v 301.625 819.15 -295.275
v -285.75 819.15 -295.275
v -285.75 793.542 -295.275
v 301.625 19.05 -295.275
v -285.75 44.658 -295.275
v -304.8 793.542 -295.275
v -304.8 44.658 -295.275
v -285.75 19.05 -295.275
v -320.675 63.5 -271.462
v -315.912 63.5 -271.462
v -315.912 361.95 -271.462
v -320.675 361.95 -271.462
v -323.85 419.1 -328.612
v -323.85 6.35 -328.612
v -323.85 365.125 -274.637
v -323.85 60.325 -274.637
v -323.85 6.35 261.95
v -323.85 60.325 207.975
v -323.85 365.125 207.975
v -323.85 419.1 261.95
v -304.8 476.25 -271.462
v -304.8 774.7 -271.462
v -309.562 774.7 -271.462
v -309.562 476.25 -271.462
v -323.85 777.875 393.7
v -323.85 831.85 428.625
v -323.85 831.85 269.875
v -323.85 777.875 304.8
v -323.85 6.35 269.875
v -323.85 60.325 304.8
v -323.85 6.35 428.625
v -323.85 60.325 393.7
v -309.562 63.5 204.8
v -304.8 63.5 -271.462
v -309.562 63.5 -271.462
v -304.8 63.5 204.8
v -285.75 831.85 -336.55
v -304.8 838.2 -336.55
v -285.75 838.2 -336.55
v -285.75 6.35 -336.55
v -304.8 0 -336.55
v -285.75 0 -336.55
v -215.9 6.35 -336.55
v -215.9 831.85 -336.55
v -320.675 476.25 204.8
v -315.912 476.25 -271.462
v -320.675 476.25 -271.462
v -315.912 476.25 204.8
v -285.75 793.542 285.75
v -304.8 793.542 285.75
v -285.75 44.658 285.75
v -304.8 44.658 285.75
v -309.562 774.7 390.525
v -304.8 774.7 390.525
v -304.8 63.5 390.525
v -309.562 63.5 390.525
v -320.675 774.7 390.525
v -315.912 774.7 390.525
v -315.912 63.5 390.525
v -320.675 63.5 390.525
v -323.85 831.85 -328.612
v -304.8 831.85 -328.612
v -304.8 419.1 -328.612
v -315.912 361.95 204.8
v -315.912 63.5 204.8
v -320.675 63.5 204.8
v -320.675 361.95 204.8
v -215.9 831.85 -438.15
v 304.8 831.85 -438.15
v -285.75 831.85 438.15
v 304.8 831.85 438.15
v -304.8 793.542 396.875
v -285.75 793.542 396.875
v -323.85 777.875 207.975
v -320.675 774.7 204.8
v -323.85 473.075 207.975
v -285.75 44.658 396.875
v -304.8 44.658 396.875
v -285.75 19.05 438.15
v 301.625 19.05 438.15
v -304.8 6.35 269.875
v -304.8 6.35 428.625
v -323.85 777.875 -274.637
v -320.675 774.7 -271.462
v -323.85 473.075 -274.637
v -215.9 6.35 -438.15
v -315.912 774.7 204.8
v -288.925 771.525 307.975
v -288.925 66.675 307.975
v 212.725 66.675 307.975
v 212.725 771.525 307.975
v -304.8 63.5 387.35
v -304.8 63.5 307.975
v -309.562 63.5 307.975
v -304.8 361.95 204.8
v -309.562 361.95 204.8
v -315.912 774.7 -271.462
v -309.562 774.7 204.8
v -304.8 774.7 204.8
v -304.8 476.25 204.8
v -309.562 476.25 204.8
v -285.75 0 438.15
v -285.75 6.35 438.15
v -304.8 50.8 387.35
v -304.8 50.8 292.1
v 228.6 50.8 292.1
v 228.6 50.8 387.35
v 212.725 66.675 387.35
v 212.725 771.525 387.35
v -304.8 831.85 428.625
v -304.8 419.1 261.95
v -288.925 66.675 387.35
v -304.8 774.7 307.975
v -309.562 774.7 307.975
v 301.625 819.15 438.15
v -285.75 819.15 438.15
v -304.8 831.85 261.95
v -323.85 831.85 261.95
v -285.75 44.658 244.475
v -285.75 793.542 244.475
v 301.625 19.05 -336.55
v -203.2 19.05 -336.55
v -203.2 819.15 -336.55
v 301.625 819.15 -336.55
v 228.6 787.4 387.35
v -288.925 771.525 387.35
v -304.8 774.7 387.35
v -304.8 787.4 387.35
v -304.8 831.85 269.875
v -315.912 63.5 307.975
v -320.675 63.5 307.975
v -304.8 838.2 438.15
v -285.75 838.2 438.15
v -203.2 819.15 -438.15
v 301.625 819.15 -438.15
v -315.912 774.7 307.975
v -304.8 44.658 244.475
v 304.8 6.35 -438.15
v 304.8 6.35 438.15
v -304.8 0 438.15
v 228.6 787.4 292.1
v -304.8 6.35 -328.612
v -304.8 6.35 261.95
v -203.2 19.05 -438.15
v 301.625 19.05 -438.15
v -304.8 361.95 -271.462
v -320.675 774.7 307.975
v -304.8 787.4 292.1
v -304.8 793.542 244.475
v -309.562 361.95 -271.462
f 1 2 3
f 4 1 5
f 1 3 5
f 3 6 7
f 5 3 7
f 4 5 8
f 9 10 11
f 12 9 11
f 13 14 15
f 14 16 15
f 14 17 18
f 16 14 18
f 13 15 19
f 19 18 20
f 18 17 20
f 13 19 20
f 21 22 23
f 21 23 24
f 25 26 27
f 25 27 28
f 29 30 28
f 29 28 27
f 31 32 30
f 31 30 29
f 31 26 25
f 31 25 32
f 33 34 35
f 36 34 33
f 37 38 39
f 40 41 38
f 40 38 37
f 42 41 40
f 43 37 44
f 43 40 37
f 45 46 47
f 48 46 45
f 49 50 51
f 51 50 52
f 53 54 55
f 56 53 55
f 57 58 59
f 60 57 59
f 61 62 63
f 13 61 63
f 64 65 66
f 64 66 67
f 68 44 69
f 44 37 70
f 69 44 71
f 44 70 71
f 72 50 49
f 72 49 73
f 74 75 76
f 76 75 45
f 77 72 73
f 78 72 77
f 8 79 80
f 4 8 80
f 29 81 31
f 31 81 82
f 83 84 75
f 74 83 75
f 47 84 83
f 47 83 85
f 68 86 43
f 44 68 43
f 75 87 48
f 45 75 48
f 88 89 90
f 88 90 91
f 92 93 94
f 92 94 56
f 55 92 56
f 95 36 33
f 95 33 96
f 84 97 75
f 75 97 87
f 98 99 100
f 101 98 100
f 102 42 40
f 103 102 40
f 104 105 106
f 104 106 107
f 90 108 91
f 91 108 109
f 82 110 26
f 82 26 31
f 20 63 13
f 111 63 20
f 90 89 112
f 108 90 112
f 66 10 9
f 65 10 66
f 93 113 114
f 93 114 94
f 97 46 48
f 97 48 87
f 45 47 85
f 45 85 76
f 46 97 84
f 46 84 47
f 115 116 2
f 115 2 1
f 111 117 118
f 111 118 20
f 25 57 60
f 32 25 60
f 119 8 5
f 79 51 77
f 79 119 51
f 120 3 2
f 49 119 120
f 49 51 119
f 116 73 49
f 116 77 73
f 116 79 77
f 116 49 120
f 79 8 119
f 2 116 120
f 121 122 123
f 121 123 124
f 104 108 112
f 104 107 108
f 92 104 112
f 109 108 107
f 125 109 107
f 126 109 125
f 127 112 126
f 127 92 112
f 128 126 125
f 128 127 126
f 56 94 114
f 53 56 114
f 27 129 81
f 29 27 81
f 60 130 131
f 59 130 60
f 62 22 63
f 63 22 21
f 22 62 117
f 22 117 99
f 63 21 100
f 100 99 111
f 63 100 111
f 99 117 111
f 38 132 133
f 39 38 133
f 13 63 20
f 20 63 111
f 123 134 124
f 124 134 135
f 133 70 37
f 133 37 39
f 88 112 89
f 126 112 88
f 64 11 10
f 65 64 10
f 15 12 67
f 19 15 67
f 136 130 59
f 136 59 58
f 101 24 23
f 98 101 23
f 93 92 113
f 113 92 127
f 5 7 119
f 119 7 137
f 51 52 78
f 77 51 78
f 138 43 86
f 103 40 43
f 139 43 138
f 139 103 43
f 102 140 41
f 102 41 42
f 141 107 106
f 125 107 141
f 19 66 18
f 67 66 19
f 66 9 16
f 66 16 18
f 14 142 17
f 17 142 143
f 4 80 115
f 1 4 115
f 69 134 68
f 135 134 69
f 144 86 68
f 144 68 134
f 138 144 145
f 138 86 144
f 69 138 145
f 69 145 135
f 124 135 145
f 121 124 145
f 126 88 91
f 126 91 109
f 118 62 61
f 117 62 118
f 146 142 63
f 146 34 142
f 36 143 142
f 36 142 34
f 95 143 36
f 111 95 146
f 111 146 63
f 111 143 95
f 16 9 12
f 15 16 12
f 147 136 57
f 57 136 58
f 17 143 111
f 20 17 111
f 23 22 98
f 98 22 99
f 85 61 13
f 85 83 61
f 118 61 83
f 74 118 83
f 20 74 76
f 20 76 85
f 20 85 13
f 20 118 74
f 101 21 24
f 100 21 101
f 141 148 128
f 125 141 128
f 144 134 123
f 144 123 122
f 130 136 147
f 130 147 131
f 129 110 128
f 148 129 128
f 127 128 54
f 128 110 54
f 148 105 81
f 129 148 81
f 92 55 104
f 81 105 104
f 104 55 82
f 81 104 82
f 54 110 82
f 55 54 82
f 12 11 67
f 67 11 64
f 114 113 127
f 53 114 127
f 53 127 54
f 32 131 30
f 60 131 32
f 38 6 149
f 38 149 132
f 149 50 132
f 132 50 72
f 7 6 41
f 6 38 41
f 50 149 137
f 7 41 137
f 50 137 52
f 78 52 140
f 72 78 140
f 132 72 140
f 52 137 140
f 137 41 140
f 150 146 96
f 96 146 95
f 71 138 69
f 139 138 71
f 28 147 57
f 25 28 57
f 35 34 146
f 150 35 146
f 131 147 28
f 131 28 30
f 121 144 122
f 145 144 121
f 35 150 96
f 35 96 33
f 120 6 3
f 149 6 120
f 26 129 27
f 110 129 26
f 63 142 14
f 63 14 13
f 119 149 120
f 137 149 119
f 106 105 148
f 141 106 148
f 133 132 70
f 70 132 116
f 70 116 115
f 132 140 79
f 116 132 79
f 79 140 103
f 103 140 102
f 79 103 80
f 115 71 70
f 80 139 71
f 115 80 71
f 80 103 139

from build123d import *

# Parameters (mm, degrees)
F0_W          = 609.6
F0_H          = 876.3
F1_DEPTH      = 838.2
F2_W          = 88.9
F2_H          = 101.6
F3_DEPTH      = 838.201
F4_W          = 748.8836065574
F4_H          = 692.15
F5_DEPTH      = 19.05
F6_W          = 590.55
F6_H          = 6.35
F7_DEPTH      = 876.301
F8_W          = 587.375
F8_H          = 800.1
F9_DEPTH      = 733.425
F10_W         = 748.8836065574
F10_H         = 41.275
F11_DEPTH     = 19.05
F12_W         = 412.75
F12_H         = 590.5627
F12_W_2       = 298.45
F12_H_2       = 476.2627
F13_DEPTH     = 19.05
F14_W         = 6.35
F14_H         = 298.45
F15_DEPTH     = 476.2627
F16_SIZE      = 3.175
F17_W         = 825.5
F17_H         = 158.75
F17_W_2       = 711.2
F17_H_2       = 82.55
F18_DEPTH     = 19.05
F19_W         = 6.35
F19_H         = 711.2
F20_DEPTH     = 82.55
F21_SIZE      = 3.175
F22_W         = 504.825
F22_H         = 800.1
F23_DEPTH     = 101.6
F24_W         = 736.6
F24_H         = 95.25
F25_DEPTH     = 533.4
F26_T         = 15.875
F26_T3_DEPTH  = 37.249261314
F26_T5_DEPTH  = 37.249261314
F26_T7_DEPTH  = 37.249261314
F26_T9_DEPTH  = 37.249261314
F26_T11_DEPTH = 36.5125
F26_T13_DEPTH = 742.95
F26_T15_DEPTH = 114.3
F26_T17_DEPTH = 127
F26_T19_DEPTH = 768.35
F26_T21_DEPTH = 111.125
F26_T23_DEPTH = 36.5125


# Not quite as in the source:
# - a shell that OpenCascade refuses in one call is made with other operations: the cavity is built on its own and cut out


with BuildPart() as f1:
    # F0 (on Front) → F1 (new body)
    with BuildSketch(Plane.XZ):
        Rectangle(F0_W, F0_H)
    extrude(amount=-F1_DEPTH)

    # F2 (on face) → F3 (cut, through all)
    with BuildSketch(Plane.XZ):
        with Locations((-260.35, -387.35)):
            Rectangle(F2_W, F2_H)
    extrude(amount=-F3_DEPTH, mode=Mode.SUBTRACT)

    # F4 (on face) → F5 (cut)
    with BuildSketch(Plane(origin=(-304.8, 0, 0), x_dir=(0, -1, 0), z_dir=(-1, 0, 0))):
        with Locations((-419.1, 50.8)):
            Rectangle(F4_W, F4_H)
    extrude(amount=-F5_DEPTH, mode=Mode.SUBTRACT)

    # F6 (on face) → F7 (cut, through all)
    with BuildSketch(Plane.XY.offset(438.15)):
        with Locations((9.525, 835.025)):
            Rectangle(F6_W, F6_H)
        with Locations((9.525, 3.175)):
            Rectangle(F6_W, F6_H)
    extrude(amount=-F7_DEPTH, mode=Mode.SUBTRACT)

    # F8 (on face) → F9 (cut, through all)
    with BuildSketch(Plane.XY.offset(438.15)):
        with Locations((7.9375, 419.1)):
            Rectangle(F8_W, F8_H)
    extrude(amount=-F9_DEPTH, mode=Mode.SUBTRACT)

    # F10 (on face) → F11 (join, through all)
    with BuildSketch(Plane(origin=(-304.8, 0, 0), x_dir=(0, -1, 0), z_dir=(-1, 0, 0))):
        with Locations((-419.1, 265.1125)):
            Rectangle(F10_W, F10_H)
    extrude(amount=-F11_DEPTH)

    # F22 (on face) → F23 (cut)
    with BuildSketch(Plane(origin=(0, 0, -438.15), x_dir=(1, 0, 0), z_dir=(0, 0, -1))):
        with Locations((49.2125, -419.1)):
            Rectangle(F22_W, F22_H)
    extrude(amount=-F23_DEPTH, mode=Mode.SUBTRACT)


with BuildPart() as f13:
    # F12 (on face) → F13 (new body)
    with BuildSketch(Plane(origin=(-304.8, 0, 0), x_dir=(0, -1, 0), z_dir=(-1, 0, 0))):
        with Locations((-625.475, -33.33115)):
            Rectangle(F12_W, F12_H)
        with Locations((-625.475, -33.33115)):
            Rectangle(F12_W_2, F12_H_2, mode=Mode.SUBTRACT)
    extrude(amount=F13_DEPTH)

    # F14 (on face) → F15 (join, through all)
    with BuildSketch(Plane.XY.offset(-271.4625)):
        with Locations((-312.7375, 625.475)):
            Rectangle(F14_W, F14_H)
    extrude(amount=F15_DEPTH)

    # F16
    f16_edges = [f13.edges().sort_by_distance(p)[0] for p in [
        (-323.85, 774.7, -33.33115),
        (-323.85, 625.475, -271.4625),
        (-323.85, 476.25, -33.33115),
        (-323.85, 625.475, 204.8002),
    ]]
    chamfer(f16_edges, length=F16_SIZE)


with BuildPart() as f18:
    # F17 (on face) → F18 (new body)
    with BuildSketch(Plane(origin=(-304.8, 0, 0), x_dir=(0, -1, 0), z_dir=(-1, 0, 0))):
        with Locations((-419.1, 349.25)):
            Rectangle(F17_W, F17_H)
        with Locations((-419.1, 349.25)):
            Rectangle(F17_W_2, F17_H_2, mode=Mode.SUBTRACT)
    extrude(amount=F18_DEPTH)

    # F19 (on face) → F20 (join, through all)
    with BuildSketch(Plane.XY.offset(307.975)):
        with Locations((-312.7375, 419.1)):
            Rectangle(F19_W, F19_H)
    extrude(amount=F20_DEPTH)

    # F21
    f21_edges = [f18.edges().sort_by_distance(p)[0] for p in [
        (-323.85, 419.1, 307.975),
        (-323.85, 774.7, 349.25),
        (-323.85, 419.1, 390.525),
        (-323.85, 63.5, 349.25),
    ]]
    chamfer(f21_edges, length=F21_SIZE)

    # F24 (on face) → F25 (join)
    with BuildSketch(Plane.YZ.offset(-304.8)):
        with Locations((419.1, 339.725)):
            Rectangle(F24_W, F24_H)
    extrude(amount=F25_DEPTH)

    # F26: shell of thickness 15.875, made by hand


with BuildPart() as f26_core1:
    # F26_t2: copy of F18
    add(f18.part)

    # the walls: a layer under each face that stays
    f26_faces = [f26_core1.faces().sort_by_distance(p)[0] for p in [
        (-323.85, 694.2666666667, 296.3333333333),
        (-322.2625, 419.1, 306.3875),
        (-322.2625, 61.9125, 349.25),
        (-322.2625, 776.2875, 349.25),
        (-322.2625, 419.1, 392.1125),
        (-314.325, 419.1, 428.625),
        (-314.325, 831.85, 349.25),
        (-314.325, 419.1, 269.875),
        (-314.325, 6.35, 349.25),
        (-318.29375, 419.1, 307.975),
        (-318.29375, 63.5, 349.25),
        (-318.29375, 774.7, 349.25),
        (-318.29375, 419.1, 390.525),
        (-304.8, 694.2666666667, 402.1666666667),
        (-315.9125, 419.1, 349.25),
        (-38.1, 787.4, 339.725),
        (-38.1, 419.1, 292.1),
        (-38.1, 50.8, 339.725),
        (-307.18125, 63.5, 349.25),
        (-307.18125, 419.1, 390.525),
        (-307.18125, 774.7, 349.25),
        (-304.8, 419.1, 347.6625),
        (228.6, 419.1, 339.725),
        (-307.18125, 419.1, 307.975),
        (-309.5625, 419.1, 349.25),
    ]]
    thicken(f26_faces, amount=-F26_T, mode=Mode.SUBTRACT)

    # F26_s4 → F26_t3 (cut)
    with BuildSketch(Plane(origin=(4.5928978099, 4.5928978099, 4.5928978099), x_dir=(-0.7071067812, 0.7071067812, 0), z_dir=(0.5773502692, 0.5773502692, 0.5773502692))):
        Polygon((271.8908726623, 356.5892701441), (263.7152476623, 342.7036353262), (255.7777476623, 347.2863530879), (255.7777476623, 356.4517886113), align=None)
    extrude(amount=F26_T3_DEPTH, mode=Mode.SUBTRACT)

    # F26_s6 → F26_t5 (cut)
    with BuildSketch(Plane(origin=(-274.8071021901, 274.80710219, -274.8071021901), x_dir=(0.7071067812, 0.7071067812, 0), z_dir=(0.5773502692, -0.5773502692, 0.5773502692))):
        Polygon((320.8060313282, 698.7829872109), (328.9816563282, 684.897352393), (336.9191563282, 689.4800701547), (336.9191563282, 698.6455056781), align=None)
    extrude(amount=F26_T5_DEPTH, mode=Mode.SUBTRACT)

    # F26_s8 → F26_t7 (cut)
    with BuildSketch(Plane(origin=(-228.2404355234, -228.2404355234, 228.2404355234), x_dir=(-0.7071067812, 0.7071067812, 0), z_dir=(0.5773502692, 0.5773502692, -0.5773502692))):
        Polygon((271.8908726623, 213.7335916339), (255.7777476623, 213.8710731668), (255.7777476623, 223.0365086901), (263.7152476623, 227.6192264518), align=None)
    extrude(amount=F26_T7_DEPTH, mode=Mode.SUBTRACT)

    # F26_s10 → F26_t9 (cut)
    with BuildSketch(Plane(origin=(-507.6404355234, 507.6404355234, 507.6404355234), x_dir=(0.7071067812, 0.7071067812, 0), z_dir=(0.5773502692, -0.5773502692, -0.5773502692))):
        Polygon((320.8060313282, -128.4601254329), (336.9191563282, -128.3226439001), (336.9191563282, -119.1572083767), (328.9816563282, -114.574490615), align=None)
    extrude(amount=F26_T9_DEPTH, mode=Mode.SUBTRACT)

    # F26_s12 → F26_t11 (cut)
    with BuildSketch(Plane.YZ.offset(-336.55)):
        Polygon((774.54125, 308.13375), (774.7, 292.1), (790.575, 292.1), (790.575, 307.975), align=None)
        Polygon((63.65875, 308.13375), (63.5, 292.1), (47.625, 292.1), (47.625, 307.975), align=None)
        Polygon((63.65875, 390.36625), (47.625, 390.525), (47.625, 406.4), (63.5, 406.4), align=None)
        Polygon((774.54125, 390.36625), (790.575, 390.525), (790.575, 406.4), (774.7, 406.4), align=None)
    extrude(amount=F26_T11_DEPTH, mode=Mode.SUBTRACT)

    # F26_s14 → F26_t13 (cut)
    with BuildSketch(Plane.XZ.offset(-790.575)):
        Polygon((-316.07125, 308.13375), (-315.9125, 292.1), (-300.0375, 292.1), (-300.0375, 307.975), align=None)
        Polygon((-316.07125, 390.36625), (-315.9125, 406.4), (-300.0375, 406.4), (-300.0375, 390.525), align=None)
        Polygon((-309.40375, 390.36625), (-309.5625, 406.4), (-325.4375, 406.4), (-325.4375, 390.525), align=None)
        Polygon((-304.95875, 308.13375), (-288.925, 307.975), (-288.925, 292.1), (-304.8, 292.1), align=None)
        Polygon((-309.40375, 308.13375), (-309.5625, 292.1), (-325.4375, 292.1), (-325.4375, 307.975), align=None)
    extrude(amount=F26_T13_DEPTH, mode=Mode.SUBTRACT)

    # F26_s16 → F26_t15 (cut)
    with BuildSketch(Plane.XY.offset(292.1)):
        Polygon((-316.07125, 63.65875), (-315.9125, 47.625), (-300.0375, 47.625), (-300.0375, 63.5), align=None)
        Polygon((-316.07125, 774.54125), (-315.9125, 790.575), (-300.0375, 790.575), (-300.0375, 774.7), align=None)
        Polygon((-309.40375, 63.65875), (-309.5625, 47.625), (-325.4375, 47.625), (-325.4375, 63.5), align=None)
        Polygon((-309.40375, 774.54125), (-309.5625, 790.575), (-325.4375, 790.575), (-325.4375, 774.7), align=None)
    extrude(amount=F26_T15_DEPTH, mode=Mode.SUBTRACT)

    # F26_s18 → F26_t17 (cut)
    with BuildSketch(Plane.XY.offset(276.225)):
        Polygon((-304.64125, 787.55875), (-320.675, 787.4), (-320.675, 771.525), (-304.8, 771.525), align=None)
        Polygon((-304.64125, 50.64125), (-320.675, 50.8), (-320.675, 66.675), (-304.8, 66.675), align=None)
    extrude(amount=F26_T17_DEPTH, mode=Mode.SUBTRACT)

    # F26_s20 → F26_t19 (cut)
    with BuildSketch(Plane.XZ.offset(-803.275)):
        Polygon((-304.64125, 291.94125), (-320.675, 292.1), (-320.675, 307.975), (-304.8, 307.975), align=None)
    extrude(amount=F26_T19_DEPTH, mode=Mode.SUBTRACT)

    # F26_s22 → F26_t21 (cut)
    with BuildSketch(Plane.XY.offset(292.1)):
        Polygon((-304.95875, 63.65875), (-304.8, 47.625), (-288.925, 47.625), (-288.925, 63.5), align=None)
        Polygon((-304.95875, 774.54125), (-304.8, 790.575), (-288.925, 790.575), (-288.925, 774.7), align=None)
    extrude(amount=F26_T21_DEPTH, mode=Mode.SUBTRACT)

    # F26_s24 → F26_t23 (cut)
    with BuildSketch(Plane.YZ.offset(-325.4375)):
        Polygon((63.65875, 308.13375), (47.625, 307.975), (47.625, 292.1), (63.5, 292.1), align=None)
        Polygon((63.65875, 390.36625), (47.625, 390.525), (47.625, 406.4), (63.5, 406.4), align=None)
        Polygon((774.54125, 390.36625), (774.7, 406.4), (790.575, 406.4), (790.575, 390.525), align=None)
        Polygon((774.54125, 308.13375), (790.575, 307.975), (790.575, 292.1), (774.7, 292.1), align=None)
    extrude(amount=F26_T23_DEPTH, mode=Mode.SUBTRACT)


with BuildPart() as f18_1:
    add(f18.part)

    # what is left inside the walls is the cavity
    f26_cavity = [f26_core1.part.solids().sort_by_distance(p)[0] for p in [
        (45.508333, 419.1, 308.13375),
    ]]
    add(f26_cavity, mode=Mode.SUBTRACT)


with BuildPart() as f27_1:
    # F27: instance of F13
    add(f13.part.mirror(Plane(origin=(-314.325, 419.1, -33.33115), x_dir=(1, 0, 0), z_dir=(0, -1, 0))))


solid = Compound([f1.part, f13.part, f18_1.part, f27_1.part])
